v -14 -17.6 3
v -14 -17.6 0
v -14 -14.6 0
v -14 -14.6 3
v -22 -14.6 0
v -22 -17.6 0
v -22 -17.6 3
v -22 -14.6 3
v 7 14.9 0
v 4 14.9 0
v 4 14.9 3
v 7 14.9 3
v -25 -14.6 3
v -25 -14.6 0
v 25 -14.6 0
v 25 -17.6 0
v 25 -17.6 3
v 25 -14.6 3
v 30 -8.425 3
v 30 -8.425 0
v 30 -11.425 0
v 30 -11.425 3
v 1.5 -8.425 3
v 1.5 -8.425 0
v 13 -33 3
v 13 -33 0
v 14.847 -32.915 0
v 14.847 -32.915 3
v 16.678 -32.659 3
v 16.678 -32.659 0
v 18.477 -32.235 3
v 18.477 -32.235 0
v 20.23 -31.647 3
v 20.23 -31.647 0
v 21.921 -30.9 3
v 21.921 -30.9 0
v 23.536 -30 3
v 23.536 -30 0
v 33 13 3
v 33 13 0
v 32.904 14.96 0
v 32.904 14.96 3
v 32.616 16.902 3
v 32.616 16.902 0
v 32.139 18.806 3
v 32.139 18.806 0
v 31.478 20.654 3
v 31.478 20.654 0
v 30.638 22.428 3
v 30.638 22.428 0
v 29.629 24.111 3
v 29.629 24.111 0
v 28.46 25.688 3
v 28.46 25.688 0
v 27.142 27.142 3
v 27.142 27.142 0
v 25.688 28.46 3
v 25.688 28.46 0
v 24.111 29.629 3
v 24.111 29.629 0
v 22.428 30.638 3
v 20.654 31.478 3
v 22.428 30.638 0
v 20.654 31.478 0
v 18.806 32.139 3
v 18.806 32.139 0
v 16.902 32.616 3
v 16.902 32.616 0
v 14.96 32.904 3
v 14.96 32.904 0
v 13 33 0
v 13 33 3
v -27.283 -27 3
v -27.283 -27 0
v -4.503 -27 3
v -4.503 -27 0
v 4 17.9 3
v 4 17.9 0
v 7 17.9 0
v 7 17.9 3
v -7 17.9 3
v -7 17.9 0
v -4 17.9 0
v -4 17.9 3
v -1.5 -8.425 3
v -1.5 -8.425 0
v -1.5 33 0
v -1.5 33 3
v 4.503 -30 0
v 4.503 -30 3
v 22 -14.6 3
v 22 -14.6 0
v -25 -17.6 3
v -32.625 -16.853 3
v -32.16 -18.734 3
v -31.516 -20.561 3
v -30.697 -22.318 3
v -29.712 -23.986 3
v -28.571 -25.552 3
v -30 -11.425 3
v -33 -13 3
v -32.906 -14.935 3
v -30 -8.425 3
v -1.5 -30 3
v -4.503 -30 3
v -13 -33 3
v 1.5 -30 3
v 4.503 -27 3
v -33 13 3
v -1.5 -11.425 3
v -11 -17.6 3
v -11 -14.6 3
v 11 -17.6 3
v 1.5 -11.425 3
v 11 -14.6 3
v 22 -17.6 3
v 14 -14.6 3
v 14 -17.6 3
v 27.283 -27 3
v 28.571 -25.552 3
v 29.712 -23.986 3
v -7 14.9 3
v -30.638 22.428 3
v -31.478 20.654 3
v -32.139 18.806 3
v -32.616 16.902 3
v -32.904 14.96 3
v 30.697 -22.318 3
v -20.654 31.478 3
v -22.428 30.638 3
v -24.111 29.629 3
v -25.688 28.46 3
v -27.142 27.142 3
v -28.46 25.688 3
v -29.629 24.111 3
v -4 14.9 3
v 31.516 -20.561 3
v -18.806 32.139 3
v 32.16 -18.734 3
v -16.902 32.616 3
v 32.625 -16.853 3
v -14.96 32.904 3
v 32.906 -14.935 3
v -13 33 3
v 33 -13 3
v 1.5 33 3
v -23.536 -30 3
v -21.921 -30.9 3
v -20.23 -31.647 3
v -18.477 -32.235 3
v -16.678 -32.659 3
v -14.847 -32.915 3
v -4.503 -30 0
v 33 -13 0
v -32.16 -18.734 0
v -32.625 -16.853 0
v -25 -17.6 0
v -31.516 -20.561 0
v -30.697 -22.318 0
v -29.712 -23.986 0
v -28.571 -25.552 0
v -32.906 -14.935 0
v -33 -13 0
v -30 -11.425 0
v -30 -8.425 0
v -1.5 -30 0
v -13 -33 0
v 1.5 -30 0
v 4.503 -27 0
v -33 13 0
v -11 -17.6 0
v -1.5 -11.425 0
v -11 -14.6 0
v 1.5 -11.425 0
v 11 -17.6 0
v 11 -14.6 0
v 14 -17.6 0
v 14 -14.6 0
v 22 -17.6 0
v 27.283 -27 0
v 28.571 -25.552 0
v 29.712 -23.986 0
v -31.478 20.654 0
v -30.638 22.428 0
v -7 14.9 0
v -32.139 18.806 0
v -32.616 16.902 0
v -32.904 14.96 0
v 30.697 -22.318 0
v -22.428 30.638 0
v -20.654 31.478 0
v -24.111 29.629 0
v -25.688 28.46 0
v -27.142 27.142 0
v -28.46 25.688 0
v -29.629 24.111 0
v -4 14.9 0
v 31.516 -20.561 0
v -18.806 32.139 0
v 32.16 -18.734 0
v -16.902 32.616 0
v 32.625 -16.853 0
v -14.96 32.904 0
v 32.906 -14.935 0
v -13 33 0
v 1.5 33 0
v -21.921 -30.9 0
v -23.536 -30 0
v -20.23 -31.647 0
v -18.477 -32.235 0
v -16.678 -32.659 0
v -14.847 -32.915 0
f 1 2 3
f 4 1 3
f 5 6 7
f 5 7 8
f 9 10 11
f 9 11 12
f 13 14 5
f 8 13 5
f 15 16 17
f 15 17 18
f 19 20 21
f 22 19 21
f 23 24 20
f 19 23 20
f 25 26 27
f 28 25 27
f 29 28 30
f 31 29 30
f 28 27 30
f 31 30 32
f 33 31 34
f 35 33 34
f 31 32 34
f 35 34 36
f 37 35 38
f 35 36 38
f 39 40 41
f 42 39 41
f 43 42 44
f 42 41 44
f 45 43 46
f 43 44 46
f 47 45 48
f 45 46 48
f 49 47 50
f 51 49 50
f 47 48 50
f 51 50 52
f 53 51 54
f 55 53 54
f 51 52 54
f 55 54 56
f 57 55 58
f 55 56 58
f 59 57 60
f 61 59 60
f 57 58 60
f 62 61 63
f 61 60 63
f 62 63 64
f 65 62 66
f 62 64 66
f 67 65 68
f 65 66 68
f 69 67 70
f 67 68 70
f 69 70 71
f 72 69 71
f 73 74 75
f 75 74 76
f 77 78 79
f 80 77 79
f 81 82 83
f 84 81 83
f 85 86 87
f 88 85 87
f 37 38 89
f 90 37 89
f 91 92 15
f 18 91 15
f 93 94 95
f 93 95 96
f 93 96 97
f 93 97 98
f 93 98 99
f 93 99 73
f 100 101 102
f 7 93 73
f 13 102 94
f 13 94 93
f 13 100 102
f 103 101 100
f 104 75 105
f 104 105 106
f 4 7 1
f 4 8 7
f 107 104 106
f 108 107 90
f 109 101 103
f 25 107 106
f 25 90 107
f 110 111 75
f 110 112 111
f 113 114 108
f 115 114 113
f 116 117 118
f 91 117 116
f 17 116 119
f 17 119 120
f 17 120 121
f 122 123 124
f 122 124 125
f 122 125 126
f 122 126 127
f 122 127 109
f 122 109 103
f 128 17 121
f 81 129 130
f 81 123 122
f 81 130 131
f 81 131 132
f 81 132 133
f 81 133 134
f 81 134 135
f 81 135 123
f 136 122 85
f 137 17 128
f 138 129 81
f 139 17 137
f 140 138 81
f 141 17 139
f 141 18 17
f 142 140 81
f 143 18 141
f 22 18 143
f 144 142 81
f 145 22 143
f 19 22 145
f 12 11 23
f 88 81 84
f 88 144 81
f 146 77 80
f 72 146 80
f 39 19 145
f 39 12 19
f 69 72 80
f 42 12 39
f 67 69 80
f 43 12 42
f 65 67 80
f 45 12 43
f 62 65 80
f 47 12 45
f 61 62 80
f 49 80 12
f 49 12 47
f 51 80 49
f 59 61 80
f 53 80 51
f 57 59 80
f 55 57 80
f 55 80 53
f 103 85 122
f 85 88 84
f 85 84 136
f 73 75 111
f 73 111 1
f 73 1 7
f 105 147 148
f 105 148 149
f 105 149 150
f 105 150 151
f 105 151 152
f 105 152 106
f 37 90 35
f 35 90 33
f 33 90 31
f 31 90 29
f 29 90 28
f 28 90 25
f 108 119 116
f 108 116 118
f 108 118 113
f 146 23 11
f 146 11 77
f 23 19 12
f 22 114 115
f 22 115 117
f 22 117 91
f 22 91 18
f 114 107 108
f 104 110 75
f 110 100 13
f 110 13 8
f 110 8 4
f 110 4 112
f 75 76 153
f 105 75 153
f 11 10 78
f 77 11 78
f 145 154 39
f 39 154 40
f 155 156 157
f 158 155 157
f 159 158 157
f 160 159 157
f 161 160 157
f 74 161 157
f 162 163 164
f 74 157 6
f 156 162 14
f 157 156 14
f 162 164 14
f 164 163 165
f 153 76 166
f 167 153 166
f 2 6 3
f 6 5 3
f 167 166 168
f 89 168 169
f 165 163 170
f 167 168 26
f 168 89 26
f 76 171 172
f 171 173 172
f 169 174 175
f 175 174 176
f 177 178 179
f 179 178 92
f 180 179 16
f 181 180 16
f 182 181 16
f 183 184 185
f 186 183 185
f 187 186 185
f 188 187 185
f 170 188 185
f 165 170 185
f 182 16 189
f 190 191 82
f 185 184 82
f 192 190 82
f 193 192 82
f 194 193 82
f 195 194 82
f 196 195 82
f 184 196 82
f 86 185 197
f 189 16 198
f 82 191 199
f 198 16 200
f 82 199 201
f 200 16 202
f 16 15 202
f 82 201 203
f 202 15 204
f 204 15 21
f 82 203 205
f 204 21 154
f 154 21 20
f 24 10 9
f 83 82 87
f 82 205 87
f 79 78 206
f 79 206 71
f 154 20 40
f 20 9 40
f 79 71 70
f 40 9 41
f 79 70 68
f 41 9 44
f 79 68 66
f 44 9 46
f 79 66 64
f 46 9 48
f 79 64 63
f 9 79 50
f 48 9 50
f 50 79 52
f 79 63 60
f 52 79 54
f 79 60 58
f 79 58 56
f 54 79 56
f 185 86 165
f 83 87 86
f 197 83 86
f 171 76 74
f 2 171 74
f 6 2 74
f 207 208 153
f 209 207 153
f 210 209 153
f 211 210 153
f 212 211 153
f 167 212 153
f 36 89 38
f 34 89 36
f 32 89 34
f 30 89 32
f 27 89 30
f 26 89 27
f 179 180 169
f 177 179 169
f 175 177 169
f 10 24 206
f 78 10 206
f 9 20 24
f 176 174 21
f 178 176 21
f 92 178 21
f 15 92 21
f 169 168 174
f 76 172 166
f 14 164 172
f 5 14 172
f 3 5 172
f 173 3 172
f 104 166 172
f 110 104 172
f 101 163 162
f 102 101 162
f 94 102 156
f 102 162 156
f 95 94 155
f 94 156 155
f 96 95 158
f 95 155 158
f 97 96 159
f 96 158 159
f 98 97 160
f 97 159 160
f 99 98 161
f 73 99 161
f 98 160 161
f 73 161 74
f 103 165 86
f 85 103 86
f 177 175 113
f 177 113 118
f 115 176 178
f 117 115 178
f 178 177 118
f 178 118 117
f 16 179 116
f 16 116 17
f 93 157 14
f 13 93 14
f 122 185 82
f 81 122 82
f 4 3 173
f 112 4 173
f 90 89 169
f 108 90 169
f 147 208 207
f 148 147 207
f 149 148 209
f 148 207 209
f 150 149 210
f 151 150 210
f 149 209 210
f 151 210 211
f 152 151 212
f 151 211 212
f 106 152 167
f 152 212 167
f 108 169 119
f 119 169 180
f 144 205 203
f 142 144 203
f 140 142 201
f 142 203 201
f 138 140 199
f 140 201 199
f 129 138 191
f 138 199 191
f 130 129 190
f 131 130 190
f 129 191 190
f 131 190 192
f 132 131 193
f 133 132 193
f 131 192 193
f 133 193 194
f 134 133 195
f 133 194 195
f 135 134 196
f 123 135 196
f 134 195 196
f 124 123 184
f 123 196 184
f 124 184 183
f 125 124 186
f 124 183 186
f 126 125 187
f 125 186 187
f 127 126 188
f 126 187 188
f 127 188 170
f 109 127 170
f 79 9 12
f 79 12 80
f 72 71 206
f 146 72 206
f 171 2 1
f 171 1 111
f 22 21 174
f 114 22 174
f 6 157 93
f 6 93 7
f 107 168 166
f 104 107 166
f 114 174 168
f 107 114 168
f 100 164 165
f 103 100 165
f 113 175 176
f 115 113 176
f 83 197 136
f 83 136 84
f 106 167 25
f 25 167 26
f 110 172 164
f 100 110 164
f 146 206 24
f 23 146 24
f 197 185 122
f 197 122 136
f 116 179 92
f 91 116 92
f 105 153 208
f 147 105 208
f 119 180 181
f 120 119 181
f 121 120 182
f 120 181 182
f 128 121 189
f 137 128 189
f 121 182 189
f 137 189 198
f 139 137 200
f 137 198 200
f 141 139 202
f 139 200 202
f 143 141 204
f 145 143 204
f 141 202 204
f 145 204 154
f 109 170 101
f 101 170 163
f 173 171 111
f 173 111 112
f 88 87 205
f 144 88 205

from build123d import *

# Parameters (mm, degrees)
CROQUIS1_W              = 3
CROQUIS1_H              = 3
SALIENTE_EXTRUIR1_DEPTH = 3


with BuildPart() as part:
    # Croquis1 → Saliente-Extruir1 (new body)
    with BuildSketch(Plane.XY):
        with BuildLine():
            Line((-30, -11.425), (-30, -8.425))
            Line((-30, -8.425), (-1.5, -8.425))
            Line((-1.5, -8.425), (-1.5, 30))
            Line((-1.5, 30), (-1.5, 33))
            Line((-1.5, 33), (-13, 33))
            ThreePointArc((-13, 33), (-27.142135624, 27.142135624), (-33, 13))
            Line((-33, 13), (-33, -13))
            ThreePointArc((-33, -13), (-31.515630385, -20.561179235), (-27.282856857, -27))
            Line((-27.282856857, -27), (-4.502856857, -27))
            Line((-4.502856857, -27), (-4.502856857, -30))
            Line((-4.502856857, -30), (-23.535653753, -30))
            ThreePointArc((-23.535653753, -30), (-18.477225575, -32.235384062), (-13, -33))
            Line((-13, -33), (13, -33))
            ThreePointArc((13, -33), (18.477225575, -32.235384062), (23.535653753, -30))
            Line((23.535653753, -30), (4.502856857, -30))
            Line((4.502856857, -30), (4.502856857, -27))
            Line((4.502856857, -27), (27.282856857, -27))
            ThreePointArc((27.282856857, -27), (31.515630385, -20.561179235), (33, -13))
            Line((33, -13), (33, 13))
            ThreePointArc((33, 13), (27.142135624, 27.142135624), (13, 33))
            Line((13, 33), (1.5, 33))
            Line((1.5, 33), (1.5, 30))
            Line((1.5, 30), (1.5, -8.425))
            Line((1.5, -8.425), (30, -8.425))
            Line((30, -8.425), (30, -11.425))
            Line((30, -11.425), (1.5, -11.425))
            Line((1.5, -11.425), (1.5, -30))
            Line((1.5, -30), (-1.5, -30))
            Line((-1.5, -30), (-1.5, -11.425))
            Line((-1.5, -11.425), (-30, -11.425))
        make_face()
        with Locations((-23.5, -16.1)):
            Rectangle(CROQUIS1_W, CROQUIS1_H, mode=Mode.SUBTRACT)
        with Locations((-12.5, -16.1)):
            Rectangle(CROQUIS1_W, CROQUIS1_H, mode=Mode.SUBTRACT)
        with Locations((12.5, -16.1)):
            Rectangle(CROQUIS1_W, CROQUIS1_H, mode=Mode.SUBTRACT)
        with Locations((23.5, -16.1)):
            Rectangle(CROQUIS1_W, CROQUIS1_H, mode=Mode.SUBTRACT)
        with Locations((-5.5, 16.4)):
            Rectangle(CROQUIS1_W, CROQUIS1_H, mode=Mode.SUBTRACT)
        with Locations((5.5, 16.4)):
            Rectangle(CROQUIS1_W, CROQUIS1_H, mode=Mode.SUBTRACT)
    extrude(amount=SALIENTE_EXTRUIR1_DEPTH)


solid = part.part
